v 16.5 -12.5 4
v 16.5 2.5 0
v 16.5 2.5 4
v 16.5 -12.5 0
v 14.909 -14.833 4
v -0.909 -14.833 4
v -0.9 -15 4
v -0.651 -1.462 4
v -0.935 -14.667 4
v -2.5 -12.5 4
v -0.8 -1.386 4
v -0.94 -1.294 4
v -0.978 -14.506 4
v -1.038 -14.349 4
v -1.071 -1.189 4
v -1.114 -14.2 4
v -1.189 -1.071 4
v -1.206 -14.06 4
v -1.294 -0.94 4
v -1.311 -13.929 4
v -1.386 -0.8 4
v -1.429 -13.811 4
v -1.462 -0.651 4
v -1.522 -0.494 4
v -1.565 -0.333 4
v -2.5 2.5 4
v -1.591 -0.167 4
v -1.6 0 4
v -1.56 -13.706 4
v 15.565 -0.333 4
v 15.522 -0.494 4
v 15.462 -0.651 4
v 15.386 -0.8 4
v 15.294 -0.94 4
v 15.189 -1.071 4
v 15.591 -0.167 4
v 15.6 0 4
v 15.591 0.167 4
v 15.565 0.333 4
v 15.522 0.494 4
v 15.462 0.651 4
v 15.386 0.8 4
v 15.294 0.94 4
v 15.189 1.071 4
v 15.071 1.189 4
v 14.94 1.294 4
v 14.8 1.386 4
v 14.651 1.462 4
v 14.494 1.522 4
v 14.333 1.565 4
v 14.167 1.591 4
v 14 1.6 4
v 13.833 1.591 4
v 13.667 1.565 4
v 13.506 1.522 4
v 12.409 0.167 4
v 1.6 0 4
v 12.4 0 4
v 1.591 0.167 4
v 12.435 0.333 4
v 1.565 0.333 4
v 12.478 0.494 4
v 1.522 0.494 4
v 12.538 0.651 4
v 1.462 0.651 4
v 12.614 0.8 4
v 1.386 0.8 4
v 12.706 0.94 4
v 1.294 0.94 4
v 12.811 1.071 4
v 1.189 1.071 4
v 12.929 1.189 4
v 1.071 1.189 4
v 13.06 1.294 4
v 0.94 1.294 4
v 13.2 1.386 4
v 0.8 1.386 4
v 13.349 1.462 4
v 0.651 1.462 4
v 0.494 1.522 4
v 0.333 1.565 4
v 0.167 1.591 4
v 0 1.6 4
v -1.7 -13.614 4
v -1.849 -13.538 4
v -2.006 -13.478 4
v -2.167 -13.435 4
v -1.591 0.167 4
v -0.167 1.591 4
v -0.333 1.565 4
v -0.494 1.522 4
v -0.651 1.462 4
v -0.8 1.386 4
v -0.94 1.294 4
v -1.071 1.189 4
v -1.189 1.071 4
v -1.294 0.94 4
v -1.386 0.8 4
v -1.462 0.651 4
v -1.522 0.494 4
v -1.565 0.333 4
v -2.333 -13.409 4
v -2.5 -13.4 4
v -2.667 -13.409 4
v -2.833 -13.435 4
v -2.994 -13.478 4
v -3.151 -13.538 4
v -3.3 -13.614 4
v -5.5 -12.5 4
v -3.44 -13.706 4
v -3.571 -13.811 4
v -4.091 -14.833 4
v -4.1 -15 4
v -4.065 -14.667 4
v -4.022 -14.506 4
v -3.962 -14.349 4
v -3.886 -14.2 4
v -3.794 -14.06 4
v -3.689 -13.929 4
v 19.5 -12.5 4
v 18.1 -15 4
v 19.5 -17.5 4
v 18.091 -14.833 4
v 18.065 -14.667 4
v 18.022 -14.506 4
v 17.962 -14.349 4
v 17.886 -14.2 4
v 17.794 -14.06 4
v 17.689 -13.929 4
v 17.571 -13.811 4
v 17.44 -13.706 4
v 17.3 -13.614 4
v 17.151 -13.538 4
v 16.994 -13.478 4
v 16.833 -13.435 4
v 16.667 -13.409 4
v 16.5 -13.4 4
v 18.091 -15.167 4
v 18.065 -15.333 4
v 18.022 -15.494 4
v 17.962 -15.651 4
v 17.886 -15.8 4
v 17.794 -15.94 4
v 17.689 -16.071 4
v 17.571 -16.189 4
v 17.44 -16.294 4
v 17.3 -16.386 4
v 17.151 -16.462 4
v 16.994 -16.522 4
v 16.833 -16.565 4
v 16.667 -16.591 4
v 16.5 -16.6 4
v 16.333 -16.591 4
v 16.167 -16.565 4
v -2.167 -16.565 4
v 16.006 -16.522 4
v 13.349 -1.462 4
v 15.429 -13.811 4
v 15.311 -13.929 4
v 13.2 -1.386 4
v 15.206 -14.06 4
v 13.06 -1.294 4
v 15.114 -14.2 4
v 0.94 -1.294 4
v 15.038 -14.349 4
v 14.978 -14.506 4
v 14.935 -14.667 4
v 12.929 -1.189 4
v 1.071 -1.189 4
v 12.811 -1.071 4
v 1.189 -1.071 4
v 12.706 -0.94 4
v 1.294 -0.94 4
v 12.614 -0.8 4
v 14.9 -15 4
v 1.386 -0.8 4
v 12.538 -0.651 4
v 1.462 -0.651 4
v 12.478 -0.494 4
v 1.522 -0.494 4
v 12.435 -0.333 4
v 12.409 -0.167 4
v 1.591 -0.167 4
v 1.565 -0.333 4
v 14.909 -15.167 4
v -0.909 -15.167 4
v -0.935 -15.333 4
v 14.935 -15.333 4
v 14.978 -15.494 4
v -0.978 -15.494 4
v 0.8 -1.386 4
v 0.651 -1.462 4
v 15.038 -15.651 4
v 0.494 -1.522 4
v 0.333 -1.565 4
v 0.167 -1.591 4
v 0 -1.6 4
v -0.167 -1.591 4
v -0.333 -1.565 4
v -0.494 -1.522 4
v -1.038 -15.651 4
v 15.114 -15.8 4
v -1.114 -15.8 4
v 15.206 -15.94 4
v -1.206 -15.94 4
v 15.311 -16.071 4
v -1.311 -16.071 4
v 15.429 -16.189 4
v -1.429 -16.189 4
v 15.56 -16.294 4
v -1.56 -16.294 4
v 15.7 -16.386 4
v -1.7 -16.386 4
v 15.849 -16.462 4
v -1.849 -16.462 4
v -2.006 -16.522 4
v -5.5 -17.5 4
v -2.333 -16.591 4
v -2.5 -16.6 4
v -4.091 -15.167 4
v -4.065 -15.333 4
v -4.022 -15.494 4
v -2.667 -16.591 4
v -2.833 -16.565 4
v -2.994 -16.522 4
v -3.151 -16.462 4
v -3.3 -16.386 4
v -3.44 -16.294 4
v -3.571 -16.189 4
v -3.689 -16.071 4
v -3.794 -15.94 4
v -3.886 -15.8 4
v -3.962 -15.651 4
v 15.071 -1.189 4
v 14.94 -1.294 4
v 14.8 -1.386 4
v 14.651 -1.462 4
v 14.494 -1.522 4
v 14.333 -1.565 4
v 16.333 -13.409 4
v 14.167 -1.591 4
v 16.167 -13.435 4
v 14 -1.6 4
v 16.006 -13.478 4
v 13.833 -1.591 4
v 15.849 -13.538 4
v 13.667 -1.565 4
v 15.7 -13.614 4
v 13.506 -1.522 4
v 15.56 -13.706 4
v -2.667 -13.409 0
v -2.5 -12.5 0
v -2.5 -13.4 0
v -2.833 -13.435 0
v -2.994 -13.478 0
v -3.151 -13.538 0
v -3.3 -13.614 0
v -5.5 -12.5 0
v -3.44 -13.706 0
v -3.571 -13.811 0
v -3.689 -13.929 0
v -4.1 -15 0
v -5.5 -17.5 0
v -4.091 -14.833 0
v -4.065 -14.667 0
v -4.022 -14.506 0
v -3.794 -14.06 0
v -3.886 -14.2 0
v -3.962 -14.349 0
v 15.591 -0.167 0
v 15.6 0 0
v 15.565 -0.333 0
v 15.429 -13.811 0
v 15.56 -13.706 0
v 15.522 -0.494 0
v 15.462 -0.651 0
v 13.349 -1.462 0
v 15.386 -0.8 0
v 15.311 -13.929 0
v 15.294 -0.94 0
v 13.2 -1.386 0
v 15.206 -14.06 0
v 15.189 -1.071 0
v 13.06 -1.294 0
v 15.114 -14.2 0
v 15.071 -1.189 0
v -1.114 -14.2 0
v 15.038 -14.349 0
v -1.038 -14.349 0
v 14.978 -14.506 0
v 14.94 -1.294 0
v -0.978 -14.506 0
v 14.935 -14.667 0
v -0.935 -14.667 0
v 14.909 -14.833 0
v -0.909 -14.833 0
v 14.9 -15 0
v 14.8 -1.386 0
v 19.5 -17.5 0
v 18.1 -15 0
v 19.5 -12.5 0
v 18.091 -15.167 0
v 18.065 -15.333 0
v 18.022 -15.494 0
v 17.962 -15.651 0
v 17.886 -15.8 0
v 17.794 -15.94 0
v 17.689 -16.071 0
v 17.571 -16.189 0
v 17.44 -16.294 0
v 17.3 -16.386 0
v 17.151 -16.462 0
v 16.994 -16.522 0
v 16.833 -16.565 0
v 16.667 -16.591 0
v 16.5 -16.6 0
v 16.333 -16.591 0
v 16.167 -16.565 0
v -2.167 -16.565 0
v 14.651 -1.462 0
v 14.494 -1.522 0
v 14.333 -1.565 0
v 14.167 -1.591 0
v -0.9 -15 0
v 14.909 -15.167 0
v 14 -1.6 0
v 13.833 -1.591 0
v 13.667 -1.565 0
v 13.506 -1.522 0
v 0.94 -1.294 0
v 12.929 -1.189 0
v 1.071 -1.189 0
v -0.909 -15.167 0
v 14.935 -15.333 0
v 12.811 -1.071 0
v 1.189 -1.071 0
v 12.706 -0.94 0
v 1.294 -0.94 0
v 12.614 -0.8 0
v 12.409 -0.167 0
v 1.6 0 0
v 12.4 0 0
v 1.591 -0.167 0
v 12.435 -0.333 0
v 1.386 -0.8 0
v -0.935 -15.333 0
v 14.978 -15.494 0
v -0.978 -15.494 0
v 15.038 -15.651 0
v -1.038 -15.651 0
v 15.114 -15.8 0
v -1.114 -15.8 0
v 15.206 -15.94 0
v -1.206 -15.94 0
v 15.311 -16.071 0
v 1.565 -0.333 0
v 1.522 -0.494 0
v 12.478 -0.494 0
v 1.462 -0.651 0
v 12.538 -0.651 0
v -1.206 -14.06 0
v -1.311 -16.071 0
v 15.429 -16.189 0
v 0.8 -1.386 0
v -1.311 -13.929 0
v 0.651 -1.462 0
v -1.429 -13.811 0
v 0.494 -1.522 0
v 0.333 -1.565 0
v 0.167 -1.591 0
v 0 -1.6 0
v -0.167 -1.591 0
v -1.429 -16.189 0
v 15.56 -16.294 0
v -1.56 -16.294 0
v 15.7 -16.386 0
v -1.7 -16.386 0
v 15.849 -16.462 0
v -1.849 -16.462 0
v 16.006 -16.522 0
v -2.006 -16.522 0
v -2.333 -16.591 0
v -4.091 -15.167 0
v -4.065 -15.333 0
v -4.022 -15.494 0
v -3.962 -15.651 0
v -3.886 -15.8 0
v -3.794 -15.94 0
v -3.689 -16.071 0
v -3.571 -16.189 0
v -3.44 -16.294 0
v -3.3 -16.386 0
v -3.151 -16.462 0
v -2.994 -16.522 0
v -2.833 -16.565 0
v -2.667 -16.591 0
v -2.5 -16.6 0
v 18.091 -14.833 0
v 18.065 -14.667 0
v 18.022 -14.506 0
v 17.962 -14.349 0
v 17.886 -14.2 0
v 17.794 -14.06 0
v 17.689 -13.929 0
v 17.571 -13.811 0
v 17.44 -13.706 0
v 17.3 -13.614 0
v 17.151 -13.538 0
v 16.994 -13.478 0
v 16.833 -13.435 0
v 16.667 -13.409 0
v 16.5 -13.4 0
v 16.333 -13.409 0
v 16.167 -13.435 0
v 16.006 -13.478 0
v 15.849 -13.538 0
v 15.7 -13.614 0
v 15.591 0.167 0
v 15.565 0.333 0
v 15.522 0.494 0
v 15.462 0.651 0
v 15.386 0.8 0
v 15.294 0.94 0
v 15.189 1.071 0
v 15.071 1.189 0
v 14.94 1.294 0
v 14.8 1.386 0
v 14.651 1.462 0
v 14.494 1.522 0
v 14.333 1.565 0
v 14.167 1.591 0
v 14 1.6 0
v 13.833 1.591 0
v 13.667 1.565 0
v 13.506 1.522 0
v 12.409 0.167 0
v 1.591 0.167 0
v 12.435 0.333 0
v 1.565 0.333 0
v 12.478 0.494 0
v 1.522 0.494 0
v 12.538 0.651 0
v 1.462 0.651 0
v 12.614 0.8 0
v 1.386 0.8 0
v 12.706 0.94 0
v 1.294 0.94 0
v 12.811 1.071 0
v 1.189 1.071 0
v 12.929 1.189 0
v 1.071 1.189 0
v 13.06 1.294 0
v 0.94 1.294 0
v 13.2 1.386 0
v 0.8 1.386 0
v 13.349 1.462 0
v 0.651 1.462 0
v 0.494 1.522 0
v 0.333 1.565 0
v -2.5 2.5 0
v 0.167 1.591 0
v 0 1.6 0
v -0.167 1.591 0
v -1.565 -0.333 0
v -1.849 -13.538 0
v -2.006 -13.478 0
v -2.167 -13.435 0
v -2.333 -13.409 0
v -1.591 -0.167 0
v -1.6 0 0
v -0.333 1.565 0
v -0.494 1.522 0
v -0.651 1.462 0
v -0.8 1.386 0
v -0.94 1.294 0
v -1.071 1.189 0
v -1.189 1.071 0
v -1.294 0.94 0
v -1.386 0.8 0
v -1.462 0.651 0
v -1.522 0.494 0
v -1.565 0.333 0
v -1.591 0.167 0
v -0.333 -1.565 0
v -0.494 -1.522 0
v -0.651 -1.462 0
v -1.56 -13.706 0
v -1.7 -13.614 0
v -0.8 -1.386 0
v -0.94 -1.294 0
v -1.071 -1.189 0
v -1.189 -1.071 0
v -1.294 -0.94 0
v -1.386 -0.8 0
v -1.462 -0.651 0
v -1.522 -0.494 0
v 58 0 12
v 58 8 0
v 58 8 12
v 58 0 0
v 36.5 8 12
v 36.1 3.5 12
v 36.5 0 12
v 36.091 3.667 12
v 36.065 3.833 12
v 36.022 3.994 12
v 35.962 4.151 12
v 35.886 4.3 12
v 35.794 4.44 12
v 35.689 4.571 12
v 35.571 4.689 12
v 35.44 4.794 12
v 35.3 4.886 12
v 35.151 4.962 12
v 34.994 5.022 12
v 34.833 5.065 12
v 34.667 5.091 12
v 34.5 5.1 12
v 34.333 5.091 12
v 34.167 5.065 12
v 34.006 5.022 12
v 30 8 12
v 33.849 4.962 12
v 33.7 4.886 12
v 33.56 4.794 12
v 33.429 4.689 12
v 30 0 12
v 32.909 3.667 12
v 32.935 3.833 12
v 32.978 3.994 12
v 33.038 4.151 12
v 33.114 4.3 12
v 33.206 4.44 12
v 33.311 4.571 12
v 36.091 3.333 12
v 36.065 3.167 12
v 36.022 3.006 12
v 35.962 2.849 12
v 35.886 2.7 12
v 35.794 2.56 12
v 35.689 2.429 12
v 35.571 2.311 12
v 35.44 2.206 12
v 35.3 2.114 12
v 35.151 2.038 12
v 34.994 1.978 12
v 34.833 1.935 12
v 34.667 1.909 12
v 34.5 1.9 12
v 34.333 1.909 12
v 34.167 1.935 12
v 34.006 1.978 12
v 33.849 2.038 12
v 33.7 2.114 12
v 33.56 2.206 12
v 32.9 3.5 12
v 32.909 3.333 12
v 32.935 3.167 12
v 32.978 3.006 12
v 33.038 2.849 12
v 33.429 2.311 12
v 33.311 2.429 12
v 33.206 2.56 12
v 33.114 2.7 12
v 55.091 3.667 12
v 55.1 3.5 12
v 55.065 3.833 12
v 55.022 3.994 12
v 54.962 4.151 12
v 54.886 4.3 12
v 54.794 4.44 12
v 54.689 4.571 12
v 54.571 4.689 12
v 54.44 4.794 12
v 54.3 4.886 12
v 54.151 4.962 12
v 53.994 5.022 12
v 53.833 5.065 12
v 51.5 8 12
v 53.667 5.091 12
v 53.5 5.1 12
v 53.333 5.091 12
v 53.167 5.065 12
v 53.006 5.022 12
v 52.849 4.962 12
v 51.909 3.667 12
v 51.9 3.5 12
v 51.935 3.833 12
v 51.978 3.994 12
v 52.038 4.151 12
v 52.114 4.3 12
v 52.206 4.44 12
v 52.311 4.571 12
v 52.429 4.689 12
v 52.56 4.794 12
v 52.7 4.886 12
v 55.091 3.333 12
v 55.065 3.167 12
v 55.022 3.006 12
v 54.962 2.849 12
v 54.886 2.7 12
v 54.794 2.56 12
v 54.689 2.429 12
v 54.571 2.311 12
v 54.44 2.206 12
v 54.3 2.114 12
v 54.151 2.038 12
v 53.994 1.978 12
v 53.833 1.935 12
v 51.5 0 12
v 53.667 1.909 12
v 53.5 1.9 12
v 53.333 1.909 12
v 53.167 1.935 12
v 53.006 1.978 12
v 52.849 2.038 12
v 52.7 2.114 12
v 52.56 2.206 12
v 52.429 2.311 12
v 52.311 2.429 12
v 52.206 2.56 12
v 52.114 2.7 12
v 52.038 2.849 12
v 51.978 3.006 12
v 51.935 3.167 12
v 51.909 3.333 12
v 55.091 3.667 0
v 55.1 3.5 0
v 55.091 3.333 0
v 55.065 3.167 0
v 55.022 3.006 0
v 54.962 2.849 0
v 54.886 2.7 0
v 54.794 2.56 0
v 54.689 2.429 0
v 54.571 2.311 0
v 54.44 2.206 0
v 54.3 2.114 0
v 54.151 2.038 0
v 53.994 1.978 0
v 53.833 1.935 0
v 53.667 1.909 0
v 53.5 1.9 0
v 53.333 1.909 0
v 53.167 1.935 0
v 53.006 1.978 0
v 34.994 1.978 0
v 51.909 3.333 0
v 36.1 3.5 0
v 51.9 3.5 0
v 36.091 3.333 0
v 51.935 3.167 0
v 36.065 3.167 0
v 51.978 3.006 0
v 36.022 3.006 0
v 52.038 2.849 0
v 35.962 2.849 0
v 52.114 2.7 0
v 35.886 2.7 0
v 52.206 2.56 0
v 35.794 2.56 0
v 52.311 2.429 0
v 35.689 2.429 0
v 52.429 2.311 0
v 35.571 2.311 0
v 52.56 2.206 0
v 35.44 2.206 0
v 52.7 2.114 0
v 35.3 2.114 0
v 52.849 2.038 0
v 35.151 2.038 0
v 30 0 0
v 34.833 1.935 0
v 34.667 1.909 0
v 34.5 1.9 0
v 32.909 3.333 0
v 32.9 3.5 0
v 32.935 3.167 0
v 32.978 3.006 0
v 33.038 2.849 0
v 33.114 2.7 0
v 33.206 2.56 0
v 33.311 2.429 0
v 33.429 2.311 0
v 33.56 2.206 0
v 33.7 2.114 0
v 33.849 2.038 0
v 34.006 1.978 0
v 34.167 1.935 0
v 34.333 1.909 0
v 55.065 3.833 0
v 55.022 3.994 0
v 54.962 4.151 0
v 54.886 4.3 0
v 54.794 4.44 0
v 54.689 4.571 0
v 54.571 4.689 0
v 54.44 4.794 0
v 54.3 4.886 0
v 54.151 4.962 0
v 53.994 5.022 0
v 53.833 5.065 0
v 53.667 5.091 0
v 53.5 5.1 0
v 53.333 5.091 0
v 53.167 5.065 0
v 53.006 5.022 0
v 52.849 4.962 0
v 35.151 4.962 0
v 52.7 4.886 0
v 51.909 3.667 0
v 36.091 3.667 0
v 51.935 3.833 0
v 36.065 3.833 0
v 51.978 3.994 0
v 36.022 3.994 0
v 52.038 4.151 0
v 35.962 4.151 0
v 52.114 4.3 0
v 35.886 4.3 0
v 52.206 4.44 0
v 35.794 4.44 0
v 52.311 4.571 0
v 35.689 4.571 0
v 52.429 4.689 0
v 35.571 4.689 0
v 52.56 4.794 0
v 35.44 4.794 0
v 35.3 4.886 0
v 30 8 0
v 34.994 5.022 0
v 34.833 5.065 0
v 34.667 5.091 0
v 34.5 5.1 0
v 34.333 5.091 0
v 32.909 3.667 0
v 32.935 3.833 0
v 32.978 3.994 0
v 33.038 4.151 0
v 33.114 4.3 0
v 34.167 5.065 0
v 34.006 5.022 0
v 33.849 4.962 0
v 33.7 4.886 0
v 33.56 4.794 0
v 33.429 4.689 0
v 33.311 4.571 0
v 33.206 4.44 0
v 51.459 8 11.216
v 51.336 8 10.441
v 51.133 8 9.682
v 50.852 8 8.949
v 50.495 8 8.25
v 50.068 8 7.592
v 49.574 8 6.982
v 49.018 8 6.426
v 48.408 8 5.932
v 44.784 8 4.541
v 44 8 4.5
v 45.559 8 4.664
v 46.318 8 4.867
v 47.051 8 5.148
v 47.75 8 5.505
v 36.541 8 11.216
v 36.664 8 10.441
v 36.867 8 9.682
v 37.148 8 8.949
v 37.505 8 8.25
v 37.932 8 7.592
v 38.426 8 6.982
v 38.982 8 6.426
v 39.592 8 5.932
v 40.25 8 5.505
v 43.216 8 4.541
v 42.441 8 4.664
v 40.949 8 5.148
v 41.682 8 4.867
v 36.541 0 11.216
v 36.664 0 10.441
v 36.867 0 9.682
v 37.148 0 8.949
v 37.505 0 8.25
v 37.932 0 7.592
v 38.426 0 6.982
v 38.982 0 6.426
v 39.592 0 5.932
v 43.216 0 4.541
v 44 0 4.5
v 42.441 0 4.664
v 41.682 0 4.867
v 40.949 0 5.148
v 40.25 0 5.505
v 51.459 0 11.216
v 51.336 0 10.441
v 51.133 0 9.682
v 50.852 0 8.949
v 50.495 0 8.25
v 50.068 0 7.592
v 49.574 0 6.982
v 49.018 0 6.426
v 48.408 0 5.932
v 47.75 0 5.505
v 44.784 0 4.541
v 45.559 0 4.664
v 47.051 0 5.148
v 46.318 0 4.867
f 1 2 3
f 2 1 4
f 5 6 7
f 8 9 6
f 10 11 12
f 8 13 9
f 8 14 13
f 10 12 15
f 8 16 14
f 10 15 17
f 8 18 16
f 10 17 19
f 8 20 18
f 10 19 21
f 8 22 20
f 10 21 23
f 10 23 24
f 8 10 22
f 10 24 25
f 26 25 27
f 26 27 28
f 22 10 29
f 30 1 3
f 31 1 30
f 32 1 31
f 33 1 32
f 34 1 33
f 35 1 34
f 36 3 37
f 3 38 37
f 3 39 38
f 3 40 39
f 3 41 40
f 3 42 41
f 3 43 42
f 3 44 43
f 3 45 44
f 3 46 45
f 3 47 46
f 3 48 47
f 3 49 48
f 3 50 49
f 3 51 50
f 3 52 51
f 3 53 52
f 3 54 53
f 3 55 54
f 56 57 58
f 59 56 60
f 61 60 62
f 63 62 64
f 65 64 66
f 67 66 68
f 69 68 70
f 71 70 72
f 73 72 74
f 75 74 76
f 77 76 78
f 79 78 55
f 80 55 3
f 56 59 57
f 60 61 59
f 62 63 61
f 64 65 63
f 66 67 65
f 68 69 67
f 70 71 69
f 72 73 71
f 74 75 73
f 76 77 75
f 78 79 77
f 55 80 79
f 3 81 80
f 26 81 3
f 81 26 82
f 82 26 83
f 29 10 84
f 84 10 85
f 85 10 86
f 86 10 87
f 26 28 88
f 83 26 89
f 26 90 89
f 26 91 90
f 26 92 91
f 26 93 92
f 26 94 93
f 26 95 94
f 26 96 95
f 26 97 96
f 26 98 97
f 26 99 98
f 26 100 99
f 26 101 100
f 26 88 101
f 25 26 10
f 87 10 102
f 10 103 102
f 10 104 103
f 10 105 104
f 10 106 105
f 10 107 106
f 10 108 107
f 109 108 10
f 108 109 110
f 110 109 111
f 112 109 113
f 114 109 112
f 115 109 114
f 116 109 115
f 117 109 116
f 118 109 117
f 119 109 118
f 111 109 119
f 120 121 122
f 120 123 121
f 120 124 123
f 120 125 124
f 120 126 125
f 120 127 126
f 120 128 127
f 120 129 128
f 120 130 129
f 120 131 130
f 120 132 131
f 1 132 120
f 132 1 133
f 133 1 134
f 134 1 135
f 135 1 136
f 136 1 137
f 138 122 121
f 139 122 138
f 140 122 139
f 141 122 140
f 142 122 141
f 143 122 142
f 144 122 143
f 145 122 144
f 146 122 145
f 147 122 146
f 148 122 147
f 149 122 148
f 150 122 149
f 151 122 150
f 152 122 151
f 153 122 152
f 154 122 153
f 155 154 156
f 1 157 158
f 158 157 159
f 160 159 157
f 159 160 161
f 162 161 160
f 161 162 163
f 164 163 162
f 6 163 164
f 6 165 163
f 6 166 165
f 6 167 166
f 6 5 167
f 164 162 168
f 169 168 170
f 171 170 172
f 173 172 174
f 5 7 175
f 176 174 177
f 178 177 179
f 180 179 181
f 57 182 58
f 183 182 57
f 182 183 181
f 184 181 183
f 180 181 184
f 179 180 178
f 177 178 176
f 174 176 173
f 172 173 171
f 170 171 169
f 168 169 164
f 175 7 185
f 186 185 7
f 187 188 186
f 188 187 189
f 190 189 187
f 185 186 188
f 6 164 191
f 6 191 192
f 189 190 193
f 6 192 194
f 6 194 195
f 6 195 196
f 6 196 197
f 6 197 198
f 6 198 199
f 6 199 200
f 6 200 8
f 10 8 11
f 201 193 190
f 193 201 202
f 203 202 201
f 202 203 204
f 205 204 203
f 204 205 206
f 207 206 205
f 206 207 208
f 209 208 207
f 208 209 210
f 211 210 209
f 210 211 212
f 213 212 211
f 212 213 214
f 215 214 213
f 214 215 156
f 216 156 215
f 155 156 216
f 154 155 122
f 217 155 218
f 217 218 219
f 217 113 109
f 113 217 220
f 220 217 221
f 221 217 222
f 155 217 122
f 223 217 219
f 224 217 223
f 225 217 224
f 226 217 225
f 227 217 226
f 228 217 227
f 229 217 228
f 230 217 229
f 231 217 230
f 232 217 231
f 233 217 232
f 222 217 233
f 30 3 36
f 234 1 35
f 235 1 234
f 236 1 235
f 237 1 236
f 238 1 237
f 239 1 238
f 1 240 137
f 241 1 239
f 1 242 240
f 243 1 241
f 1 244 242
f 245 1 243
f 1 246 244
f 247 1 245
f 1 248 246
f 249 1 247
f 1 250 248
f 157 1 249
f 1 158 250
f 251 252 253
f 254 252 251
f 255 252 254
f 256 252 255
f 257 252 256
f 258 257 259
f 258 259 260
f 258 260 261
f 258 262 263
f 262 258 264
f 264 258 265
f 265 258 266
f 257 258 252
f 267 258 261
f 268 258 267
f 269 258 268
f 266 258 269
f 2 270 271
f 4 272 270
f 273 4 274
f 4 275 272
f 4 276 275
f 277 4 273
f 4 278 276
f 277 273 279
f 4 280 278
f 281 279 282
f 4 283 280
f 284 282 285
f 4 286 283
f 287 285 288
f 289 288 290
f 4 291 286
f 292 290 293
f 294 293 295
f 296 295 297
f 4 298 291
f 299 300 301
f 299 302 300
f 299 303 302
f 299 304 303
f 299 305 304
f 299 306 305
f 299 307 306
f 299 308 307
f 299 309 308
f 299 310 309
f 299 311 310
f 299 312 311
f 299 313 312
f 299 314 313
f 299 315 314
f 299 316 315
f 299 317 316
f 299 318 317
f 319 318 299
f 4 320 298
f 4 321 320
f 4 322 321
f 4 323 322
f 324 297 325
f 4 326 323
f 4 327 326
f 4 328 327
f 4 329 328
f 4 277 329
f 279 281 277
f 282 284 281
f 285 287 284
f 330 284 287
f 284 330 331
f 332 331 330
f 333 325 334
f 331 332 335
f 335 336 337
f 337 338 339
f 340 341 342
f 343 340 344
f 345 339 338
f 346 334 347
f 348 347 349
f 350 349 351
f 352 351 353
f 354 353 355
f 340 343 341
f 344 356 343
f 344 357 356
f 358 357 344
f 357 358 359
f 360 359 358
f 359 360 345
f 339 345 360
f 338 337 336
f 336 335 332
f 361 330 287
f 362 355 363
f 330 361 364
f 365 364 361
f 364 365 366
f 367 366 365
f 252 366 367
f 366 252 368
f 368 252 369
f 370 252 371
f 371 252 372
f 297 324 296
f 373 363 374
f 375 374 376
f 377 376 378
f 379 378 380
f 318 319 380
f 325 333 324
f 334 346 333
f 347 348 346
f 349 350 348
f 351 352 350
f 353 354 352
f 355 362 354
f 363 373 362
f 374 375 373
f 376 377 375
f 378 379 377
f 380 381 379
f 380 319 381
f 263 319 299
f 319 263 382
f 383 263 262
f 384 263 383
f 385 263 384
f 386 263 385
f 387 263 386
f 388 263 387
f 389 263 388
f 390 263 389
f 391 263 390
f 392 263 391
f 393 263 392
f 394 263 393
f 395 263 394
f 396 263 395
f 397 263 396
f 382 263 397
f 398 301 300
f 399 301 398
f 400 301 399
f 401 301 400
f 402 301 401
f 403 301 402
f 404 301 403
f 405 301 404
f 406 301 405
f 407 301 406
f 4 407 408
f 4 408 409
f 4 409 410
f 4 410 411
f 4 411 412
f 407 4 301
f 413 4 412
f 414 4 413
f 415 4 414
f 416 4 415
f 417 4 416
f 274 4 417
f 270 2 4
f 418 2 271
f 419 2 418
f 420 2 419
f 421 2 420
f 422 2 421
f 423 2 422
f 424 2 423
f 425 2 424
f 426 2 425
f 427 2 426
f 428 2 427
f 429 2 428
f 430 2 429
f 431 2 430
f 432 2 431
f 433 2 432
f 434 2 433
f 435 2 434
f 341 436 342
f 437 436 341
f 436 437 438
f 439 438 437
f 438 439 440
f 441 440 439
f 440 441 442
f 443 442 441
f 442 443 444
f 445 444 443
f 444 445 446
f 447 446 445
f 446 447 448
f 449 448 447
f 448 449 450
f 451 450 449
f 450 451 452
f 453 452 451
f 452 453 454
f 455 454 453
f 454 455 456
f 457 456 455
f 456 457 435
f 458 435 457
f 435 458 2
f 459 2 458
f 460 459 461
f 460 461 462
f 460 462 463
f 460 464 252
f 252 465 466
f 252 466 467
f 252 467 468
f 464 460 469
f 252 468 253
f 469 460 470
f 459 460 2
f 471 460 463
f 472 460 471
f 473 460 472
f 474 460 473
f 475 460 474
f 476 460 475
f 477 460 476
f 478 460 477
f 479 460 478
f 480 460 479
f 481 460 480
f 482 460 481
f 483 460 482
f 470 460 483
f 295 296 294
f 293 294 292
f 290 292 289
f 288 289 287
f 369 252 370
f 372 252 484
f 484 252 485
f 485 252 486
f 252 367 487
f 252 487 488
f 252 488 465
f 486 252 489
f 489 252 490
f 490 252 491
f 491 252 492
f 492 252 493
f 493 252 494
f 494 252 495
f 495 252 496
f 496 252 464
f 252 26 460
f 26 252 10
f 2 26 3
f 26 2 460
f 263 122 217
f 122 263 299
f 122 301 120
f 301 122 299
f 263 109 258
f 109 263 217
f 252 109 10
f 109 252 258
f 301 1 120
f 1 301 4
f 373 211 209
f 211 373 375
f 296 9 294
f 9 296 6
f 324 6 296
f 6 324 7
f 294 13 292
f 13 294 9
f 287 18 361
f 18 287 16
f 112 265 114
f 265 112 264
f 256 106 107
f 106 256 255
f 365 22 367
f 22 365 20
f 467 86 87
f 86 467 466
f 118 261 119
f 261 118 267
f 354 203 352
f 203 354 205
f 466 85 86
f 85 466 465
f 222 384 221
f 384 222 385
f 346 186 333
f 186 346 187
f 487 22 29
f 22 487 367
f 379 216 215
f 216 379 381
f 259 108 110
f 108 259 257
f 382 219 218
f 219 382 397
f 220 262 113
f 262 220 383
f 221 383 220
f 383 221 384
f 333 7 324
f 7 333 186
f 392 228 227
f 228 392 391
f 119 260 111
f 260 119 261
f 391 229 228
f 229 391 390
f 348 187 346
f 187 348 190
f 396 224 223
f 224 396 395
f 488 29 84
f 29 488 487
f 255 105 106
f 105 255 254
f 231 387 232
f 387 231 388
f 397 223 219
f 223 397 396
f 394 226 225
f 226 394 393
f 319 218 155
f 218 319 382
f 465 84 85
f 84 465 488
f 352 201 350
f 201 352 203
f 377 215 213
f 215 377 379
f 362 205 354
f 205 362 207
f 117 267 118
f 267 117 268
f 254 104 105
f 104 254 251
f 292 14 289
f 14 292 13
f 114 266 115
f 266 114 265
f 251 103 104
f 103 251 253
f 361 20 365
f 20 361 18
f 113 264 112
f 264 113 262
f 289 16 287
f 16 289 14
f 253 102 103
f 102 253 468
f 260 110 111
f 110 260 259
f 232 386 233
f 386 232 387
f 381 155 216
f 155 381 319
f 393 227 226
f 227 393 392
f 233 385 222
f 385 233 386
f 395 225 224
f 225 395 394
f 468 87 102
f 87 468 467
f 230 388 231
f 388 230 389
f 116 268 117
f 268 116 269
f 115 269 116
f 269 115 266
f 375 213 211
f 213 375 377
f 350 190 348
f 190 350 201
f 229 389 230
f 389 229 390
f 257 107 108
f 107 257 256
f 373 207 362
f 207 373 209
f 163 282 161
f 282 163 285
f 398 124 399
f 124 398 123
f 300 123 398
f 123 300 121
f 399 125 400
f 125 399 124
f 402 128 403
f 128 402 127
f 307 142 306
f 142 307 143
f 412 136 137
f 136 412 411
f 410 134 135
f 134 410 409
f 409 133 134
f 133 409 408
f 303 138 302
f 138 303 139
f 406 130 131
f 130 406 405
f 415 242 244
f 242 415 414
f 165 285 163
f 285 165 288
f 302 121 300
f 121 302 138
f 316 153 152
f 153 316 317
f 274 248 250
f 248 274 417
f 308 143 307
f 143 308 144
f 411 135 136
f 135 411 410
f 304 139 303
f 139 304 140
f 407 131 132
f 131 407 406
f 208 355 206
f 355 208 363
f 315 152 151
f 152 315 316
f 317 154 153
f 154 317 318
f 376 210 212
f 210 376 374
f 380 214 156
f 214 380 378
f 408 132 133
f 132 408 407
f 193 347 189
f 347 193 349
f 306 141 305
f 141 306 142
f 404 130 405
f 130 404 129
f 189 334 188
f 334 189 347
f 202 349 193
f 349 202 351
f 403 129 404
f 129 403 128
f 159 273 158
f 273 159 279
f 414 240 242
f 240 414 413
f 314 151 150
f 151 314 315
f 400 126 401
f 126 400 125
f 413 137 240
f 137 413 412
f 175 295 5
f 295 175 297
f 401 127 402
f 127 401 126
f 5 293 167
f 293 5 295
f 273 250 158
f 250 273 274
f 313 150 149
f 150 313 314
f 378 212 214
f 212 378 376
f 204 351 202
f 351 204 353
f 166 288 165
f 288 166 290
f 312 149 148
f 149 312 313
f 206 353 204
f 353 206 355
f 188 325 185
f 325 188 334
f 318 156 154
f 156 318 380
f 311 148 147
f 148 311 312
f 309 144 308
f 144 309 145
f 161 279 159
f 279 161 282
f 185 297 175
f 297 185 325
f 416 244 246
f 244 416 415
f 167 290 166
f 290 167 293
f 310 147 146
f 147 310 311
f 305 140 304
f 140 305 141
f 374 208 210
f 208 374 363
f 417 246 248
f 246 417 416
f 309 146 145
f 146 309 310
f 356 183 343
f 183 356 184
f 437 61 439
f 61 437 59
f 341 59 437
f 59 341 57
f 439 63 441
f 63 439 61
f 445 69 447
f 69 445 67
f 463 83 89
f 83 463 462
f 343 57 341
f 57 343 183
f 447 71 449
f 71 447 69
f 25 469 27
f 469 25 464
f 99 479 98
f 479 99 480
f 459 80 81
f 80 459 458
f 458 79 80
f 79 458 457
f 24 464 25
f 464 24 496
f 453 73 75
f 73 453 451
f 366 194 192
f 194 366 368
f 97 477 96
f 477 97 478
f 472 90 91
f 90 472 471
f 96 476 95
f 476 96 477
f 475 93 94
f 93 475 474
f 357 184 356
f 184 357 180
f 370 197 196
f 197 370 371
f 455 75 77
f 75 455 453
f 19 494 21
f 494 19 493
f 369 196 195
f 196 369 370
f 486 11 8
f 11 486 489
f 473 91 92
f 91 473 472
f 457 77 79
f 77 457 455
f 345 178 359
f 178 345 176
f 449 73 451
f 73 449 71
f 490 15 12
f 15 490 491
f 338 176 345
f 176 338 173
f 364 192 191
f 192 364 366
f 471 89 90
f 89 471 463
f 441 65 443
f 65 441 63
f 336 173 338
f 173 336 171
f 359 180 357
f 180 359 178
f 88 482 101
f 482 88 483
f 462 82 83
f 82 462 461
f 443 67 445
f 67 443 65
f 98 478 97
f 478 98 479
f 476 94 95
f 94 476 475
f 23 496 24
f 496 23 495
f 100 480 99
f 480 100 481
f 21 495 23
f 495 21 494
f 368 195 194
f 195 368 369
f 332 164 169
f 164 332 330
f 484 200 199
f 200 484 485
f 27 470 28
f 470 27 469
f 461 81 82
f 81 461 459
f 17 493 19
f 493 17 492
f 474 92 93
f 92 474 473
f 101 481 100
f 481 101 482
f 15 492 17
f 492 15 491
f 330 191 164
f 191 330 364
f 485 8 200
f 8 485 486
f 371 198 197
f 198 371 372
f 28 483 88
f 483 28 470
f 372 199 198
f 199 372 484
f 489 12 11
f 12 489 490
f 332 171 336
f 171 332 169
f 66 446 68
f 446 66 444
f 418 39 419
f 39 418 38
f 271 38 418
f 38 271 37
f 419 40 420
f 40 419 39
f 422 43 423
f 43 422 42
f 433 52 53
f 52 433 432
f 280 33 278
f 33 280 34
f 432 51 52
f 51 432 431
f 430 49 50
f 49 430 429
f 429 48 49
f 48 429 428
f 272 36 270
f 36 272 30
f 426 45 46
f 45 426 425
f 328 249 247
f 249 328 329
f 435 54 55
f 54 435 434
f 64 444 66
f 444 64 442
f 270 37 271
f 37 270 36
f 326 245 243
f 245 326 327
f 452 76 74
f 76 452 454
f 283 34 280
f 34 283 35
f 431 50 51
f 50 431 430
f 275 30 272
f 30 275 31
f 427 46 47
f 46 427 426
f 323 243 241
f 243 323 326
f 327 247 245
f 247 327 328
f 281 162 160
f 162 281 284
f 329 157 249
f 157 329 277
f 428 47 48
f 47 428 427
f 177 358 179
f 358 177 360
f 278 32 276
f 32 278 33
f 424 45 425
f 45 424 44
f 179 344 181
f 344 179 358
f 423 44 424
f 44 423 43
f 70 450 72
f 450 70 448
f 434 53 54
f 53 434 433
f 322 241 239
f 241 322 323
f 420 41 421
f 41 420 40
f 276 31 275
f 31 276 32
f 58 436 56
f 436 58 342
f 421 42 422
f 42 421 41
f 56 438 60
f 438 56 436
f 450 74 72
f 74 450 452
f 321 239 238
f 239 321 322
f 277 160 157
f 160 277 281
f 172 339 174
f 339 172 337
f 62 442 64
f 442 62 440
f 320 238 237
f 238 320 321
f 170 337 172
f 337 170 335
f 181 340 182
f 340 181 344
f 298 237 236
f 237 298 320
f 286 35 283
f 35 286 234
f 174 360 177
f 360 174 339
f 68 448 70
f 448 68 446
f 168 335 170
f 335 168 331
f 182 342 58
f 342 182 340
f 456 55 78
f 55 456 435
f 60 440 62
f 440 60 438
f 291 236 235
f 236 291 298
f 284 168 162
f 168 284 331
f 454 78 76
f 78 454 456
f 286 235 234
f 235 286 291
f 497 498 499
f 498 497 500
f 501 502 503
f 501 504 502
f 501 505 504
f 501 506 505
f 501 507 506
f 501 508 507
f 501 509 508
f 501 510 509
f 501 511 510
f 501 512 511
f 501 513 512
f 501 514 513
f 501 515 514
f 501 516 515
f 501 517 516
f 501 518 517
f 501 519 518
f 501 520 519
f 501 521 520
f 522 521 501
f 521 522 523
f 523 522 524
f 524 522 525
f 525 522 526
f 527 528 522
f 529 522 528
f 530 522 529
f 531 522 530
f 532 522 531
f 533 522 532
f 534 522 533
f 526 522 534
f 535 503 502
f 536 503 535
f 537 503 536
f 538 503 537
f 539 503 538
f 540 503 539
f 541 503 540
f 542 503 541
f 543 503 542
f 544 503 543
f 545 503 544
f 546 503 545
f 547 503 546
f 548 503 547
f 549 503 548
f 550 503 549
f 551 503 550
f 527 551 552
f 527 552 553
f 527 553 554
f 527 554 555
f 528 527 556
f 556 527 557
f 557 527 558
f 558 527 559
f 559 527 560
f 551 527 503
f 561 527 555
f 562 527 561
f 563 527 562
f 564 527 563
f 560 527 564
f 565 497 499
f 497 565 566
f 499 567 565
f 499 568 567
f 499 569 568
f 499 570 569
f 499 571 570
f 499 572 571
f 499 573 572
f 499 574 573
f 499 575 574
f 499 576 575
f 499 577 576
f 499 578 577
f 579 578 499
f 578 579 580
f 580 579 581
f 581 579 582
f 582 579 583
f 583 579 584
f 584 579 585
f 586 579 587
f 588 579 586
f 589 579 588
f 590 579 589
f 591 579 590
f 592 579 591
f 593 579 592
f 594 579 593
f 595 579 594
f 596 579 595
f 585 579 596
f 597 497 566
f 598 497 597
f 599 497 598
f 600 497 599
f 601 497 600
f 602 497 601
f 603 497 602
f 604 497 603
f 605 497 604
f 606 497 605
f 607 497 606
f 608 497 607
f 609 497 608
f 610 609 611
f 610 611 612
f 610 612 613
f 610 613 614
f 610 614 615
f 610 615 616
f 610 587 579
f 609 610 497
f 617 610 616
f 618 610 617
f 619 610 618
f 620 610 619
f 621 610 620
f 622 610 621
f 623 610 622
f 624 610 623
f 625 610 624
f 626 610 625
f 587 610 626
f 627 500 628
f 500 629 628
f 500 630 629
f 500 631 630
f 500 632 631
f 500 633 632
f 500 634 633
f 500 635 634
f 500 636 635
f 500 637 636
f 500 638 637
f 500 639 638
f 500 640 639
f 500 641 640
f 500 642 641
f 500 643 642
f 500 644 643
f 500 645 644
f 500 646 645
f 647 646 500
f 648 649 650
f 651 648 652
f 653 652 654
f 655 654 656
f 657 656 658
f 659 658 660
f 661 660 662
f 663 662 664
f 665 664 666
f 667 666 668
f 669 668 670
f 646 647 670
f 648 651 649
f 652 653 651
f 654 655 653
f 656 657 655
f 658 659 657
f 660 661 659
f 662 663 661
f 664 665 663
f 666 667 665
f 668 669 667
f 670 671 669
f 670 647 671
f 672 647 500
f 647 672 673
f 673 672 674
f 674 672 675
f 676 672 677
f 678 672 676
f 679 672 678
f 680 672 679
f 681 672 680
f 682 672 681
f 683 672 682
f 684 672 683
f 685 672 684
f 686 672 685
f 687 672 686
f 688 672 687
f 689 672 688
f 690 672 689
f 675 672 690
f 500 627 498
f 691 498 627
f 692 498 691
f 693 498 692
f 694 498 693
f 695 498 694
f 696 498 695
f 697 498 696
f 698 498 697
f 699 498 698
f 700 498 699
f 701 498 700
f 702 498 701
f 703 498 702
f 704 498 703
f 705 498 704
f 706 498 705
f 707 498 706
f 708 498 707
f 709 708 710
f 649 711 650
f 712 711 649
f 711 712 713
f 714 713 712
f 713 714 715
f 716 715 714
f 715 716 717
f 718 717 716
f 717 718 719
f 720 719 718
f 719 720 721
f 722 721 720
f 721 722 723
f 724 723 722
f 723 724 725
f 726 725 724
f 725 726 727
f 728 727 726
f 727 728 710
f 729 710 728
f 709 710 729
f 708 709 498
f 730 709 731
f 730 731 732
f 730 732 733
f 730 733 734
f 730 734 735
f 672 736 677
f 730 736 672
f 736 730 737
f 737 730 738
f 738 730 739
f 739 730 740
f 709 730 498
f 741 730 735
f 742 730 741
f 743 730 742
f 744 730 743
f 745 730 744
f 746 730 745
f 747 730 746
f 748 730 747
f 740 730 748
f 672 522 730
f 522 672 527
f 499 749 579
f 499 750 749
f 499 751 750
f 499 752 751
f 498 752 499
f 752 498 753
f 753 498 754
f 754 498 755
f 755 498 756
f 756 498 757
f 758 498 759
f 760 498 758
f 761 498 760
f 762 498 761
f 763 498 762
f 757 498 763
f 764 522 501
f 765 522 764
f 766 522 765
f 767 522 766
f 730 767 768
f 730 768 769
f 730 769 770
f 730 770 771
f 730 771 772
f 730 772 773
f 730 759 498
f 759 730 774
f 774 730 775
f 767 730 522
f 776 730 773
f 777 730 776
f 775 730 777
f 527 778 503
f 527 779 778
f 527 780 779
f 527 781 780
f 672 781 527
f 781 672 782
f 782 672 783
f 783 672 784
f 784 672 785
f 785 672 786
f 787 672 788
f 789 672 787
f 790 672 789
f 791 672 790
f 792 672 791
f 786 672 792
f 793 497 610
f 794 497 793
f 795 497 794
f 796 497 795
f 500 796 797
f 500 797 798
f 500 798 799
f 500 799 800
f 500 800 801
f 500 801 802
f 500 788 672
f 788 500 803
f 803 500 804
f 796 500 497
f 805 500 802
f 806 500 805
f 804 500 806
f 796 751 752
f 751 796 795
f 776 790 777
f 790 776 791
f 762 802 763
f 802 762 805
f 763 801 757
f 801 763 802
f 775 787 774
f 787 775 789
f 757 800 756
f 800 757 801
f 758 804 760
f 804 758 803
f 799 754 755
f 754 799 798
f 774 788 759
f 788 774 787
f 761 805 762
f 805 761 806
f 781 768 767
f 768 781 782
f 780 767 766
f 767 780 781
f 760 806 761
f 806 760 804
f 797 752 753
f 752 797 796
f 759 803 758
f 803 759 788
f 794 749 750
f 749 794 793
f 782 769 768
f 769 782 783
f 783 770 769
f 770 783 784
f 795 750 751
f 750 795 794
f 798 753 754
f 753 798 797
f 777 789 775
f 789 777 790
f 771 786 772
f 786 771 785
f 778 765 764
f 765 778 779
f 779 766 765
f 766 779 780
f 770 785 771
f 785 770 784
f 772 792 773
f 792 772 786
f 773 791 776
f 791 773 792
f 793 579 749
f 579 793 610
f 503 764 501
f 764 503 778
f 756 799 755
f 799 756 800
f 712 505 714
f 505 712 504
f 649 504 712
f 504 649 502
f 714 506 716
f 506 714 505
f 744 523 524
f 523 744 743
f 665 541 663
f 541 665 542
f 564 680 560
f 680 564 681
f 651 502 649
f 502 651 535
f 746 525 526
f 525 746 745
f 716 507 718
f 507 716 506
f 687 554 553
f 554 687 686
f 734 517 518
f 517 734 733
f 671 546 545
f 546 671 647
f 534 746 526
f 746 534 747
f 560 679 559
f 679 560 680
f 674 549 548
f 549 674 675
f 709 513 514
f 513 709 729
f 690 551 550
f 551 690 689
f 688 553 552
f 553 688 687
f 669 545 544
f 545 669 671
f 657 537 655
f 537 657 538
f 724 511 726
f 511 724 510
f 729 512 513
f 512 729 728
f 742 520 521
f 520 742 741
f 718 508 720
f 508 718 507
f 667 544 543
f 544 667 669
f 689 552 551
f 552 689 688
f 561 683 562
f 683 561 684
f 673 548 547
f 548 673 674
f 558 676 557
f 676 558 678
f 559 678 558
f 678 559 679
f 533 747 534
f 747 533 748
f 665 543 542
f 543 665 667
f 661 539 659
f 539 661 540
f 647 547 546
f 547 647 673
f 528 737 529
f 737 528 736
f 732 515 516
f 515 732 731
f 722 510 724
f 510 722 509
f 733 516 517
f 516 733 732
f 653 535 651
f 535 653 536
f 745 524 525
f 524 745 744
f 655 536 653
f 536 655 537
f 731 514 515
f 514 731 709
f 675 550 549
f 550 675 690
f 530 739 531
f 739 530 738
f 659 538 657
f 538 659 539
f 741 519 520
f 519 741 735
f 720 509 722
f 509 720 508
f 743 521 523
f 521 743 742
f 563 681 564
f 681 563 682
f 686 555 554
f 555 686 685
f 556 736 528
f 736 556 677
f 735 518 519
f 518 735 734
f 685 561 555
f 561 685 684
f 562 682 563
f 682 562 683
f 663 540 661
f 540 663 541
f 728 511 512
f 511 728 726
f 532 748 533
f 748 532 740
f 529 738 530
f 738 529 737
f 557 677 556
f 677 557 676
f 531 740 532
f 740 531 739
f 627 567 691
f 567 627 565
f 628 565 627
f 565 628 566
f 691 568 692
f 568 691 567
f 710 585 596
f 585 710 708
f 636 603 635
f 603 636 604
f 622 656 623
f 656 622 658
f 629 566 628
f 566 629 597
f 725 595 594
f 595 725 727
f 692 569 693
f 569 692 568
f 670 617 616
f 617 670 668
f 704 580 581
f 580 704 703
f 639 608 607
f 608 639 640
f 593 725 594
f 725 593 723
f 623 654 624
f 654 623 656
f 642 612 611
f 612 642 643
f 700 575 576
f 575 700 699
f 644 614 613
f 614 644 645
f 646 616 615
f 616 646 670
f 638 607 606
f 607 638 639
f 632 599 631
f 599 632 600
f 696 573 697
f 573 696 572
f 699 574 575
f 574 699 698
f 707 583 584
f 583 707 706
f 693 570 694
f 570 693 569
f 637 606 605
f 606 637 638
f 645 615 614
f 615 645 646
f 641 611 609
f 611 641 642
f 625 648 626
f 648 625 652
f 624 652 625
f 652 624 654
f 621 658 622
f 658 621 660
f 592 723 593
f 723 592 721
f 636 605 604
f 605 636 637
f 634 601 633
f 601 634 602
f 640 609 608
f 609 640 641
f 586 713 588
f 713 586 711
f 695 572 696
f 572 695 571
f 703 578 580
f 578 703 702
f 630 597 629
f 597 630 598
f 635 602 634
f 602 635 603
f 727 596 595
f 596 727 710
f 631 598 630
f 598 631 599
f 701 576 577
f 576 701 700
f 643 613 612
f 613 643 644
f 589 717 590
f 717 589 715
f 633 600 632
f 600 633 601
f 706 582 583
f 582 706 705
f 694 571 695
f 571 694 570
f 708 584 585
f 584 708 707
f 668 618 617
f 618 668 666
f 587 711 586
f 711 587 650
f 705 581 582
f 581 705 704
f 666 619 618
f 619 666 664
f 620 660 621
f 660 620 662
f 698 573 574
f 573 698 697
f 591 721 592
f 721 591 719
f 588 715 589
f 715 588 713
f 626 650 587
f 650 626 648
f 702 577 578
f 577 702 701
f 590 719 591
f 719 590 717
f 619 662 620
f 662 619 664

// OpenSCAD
$fn = 60;

//hole diameter
hd = 1.6;



module clamp_base()
{
difference()
{
union()
{
translate([-2.5,-2.5-15,0])
cube([19,20,4]);

translate([-2.5-3,-2.5-15,0])
cube([25,5,4]);
}


//holes for the clamp thing
//19 mm between holes
translate([-2.5,-15,0])
cylinder(r=hd, h=4);
translate([14+2.5,-15,0])
cylinder(r=hd, h=4);



//holes in extruder thingy
cylinder(r=hd, h=4);
translate([14,0,0])
cylinder(r=hd, h=4);
}
}

module clamp()
{
difference()
{
difference()
{
cube([24+4,8,12]);

translate([12+2,9,12])
rotate([90,0,0])
cylinder(r=7.5, h=12);
}

//holes
translate([4.5, 3.5,-1])
cylinder(r=hd, h=25);

translate([4.5+19, 3.5,-1])
cylinder(r=hd, h=25);
}
}


clamp_base();
translate([30,0,0])
clamp();
